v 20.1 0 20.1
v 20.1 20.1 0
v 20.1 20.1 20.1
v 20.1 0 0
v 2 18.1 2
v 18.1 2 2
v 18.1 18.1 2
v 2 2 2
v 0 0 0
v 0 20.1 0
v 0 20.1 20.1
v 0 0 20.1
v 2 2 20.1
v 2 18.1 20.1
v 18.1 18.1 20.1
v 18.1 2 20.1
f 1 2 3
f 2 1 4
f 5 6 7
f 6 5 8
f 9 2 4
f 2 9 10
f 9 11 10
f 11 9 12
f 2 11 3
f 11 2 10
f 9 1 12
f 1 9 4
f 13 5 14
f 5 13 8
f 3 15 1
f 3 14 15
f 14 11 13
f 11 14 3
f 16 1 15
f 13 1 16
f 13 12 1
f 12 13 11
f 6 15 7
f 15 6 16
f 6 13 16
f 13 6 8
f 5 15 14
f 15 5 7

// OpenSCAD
/*
Exercício 1:
Transformar a caixa desenvolvida na última aula em um módulo que aceite
os parâmetros Altura (A), Largura (L), Comprimento (C) e Espessura (E) e 
crie a caixa.
*/

Espessura = 2;
Altura = 20.1;        //dimensão na direção Z
Largura = 20.1;       //dimensão na direção X
Comprimento = 20.1;   //dimensão na direção Y


module caixa(A=20,L=20,C=20,E=2) {
    //base
    cube([L,C,E]);

    //lateral esquerda
    cube([E,C,A]);

    //lateral direita
    translate([L - E,0,0]) cube([E,C,A]);

    //frente
    cube([L,E,A]);

    //fundo
    translate([0,C - E,0]) cube([L,E,A]);
}

caixa(A=Altura,L=Largura,C=Comprimento,E=Espessura);
